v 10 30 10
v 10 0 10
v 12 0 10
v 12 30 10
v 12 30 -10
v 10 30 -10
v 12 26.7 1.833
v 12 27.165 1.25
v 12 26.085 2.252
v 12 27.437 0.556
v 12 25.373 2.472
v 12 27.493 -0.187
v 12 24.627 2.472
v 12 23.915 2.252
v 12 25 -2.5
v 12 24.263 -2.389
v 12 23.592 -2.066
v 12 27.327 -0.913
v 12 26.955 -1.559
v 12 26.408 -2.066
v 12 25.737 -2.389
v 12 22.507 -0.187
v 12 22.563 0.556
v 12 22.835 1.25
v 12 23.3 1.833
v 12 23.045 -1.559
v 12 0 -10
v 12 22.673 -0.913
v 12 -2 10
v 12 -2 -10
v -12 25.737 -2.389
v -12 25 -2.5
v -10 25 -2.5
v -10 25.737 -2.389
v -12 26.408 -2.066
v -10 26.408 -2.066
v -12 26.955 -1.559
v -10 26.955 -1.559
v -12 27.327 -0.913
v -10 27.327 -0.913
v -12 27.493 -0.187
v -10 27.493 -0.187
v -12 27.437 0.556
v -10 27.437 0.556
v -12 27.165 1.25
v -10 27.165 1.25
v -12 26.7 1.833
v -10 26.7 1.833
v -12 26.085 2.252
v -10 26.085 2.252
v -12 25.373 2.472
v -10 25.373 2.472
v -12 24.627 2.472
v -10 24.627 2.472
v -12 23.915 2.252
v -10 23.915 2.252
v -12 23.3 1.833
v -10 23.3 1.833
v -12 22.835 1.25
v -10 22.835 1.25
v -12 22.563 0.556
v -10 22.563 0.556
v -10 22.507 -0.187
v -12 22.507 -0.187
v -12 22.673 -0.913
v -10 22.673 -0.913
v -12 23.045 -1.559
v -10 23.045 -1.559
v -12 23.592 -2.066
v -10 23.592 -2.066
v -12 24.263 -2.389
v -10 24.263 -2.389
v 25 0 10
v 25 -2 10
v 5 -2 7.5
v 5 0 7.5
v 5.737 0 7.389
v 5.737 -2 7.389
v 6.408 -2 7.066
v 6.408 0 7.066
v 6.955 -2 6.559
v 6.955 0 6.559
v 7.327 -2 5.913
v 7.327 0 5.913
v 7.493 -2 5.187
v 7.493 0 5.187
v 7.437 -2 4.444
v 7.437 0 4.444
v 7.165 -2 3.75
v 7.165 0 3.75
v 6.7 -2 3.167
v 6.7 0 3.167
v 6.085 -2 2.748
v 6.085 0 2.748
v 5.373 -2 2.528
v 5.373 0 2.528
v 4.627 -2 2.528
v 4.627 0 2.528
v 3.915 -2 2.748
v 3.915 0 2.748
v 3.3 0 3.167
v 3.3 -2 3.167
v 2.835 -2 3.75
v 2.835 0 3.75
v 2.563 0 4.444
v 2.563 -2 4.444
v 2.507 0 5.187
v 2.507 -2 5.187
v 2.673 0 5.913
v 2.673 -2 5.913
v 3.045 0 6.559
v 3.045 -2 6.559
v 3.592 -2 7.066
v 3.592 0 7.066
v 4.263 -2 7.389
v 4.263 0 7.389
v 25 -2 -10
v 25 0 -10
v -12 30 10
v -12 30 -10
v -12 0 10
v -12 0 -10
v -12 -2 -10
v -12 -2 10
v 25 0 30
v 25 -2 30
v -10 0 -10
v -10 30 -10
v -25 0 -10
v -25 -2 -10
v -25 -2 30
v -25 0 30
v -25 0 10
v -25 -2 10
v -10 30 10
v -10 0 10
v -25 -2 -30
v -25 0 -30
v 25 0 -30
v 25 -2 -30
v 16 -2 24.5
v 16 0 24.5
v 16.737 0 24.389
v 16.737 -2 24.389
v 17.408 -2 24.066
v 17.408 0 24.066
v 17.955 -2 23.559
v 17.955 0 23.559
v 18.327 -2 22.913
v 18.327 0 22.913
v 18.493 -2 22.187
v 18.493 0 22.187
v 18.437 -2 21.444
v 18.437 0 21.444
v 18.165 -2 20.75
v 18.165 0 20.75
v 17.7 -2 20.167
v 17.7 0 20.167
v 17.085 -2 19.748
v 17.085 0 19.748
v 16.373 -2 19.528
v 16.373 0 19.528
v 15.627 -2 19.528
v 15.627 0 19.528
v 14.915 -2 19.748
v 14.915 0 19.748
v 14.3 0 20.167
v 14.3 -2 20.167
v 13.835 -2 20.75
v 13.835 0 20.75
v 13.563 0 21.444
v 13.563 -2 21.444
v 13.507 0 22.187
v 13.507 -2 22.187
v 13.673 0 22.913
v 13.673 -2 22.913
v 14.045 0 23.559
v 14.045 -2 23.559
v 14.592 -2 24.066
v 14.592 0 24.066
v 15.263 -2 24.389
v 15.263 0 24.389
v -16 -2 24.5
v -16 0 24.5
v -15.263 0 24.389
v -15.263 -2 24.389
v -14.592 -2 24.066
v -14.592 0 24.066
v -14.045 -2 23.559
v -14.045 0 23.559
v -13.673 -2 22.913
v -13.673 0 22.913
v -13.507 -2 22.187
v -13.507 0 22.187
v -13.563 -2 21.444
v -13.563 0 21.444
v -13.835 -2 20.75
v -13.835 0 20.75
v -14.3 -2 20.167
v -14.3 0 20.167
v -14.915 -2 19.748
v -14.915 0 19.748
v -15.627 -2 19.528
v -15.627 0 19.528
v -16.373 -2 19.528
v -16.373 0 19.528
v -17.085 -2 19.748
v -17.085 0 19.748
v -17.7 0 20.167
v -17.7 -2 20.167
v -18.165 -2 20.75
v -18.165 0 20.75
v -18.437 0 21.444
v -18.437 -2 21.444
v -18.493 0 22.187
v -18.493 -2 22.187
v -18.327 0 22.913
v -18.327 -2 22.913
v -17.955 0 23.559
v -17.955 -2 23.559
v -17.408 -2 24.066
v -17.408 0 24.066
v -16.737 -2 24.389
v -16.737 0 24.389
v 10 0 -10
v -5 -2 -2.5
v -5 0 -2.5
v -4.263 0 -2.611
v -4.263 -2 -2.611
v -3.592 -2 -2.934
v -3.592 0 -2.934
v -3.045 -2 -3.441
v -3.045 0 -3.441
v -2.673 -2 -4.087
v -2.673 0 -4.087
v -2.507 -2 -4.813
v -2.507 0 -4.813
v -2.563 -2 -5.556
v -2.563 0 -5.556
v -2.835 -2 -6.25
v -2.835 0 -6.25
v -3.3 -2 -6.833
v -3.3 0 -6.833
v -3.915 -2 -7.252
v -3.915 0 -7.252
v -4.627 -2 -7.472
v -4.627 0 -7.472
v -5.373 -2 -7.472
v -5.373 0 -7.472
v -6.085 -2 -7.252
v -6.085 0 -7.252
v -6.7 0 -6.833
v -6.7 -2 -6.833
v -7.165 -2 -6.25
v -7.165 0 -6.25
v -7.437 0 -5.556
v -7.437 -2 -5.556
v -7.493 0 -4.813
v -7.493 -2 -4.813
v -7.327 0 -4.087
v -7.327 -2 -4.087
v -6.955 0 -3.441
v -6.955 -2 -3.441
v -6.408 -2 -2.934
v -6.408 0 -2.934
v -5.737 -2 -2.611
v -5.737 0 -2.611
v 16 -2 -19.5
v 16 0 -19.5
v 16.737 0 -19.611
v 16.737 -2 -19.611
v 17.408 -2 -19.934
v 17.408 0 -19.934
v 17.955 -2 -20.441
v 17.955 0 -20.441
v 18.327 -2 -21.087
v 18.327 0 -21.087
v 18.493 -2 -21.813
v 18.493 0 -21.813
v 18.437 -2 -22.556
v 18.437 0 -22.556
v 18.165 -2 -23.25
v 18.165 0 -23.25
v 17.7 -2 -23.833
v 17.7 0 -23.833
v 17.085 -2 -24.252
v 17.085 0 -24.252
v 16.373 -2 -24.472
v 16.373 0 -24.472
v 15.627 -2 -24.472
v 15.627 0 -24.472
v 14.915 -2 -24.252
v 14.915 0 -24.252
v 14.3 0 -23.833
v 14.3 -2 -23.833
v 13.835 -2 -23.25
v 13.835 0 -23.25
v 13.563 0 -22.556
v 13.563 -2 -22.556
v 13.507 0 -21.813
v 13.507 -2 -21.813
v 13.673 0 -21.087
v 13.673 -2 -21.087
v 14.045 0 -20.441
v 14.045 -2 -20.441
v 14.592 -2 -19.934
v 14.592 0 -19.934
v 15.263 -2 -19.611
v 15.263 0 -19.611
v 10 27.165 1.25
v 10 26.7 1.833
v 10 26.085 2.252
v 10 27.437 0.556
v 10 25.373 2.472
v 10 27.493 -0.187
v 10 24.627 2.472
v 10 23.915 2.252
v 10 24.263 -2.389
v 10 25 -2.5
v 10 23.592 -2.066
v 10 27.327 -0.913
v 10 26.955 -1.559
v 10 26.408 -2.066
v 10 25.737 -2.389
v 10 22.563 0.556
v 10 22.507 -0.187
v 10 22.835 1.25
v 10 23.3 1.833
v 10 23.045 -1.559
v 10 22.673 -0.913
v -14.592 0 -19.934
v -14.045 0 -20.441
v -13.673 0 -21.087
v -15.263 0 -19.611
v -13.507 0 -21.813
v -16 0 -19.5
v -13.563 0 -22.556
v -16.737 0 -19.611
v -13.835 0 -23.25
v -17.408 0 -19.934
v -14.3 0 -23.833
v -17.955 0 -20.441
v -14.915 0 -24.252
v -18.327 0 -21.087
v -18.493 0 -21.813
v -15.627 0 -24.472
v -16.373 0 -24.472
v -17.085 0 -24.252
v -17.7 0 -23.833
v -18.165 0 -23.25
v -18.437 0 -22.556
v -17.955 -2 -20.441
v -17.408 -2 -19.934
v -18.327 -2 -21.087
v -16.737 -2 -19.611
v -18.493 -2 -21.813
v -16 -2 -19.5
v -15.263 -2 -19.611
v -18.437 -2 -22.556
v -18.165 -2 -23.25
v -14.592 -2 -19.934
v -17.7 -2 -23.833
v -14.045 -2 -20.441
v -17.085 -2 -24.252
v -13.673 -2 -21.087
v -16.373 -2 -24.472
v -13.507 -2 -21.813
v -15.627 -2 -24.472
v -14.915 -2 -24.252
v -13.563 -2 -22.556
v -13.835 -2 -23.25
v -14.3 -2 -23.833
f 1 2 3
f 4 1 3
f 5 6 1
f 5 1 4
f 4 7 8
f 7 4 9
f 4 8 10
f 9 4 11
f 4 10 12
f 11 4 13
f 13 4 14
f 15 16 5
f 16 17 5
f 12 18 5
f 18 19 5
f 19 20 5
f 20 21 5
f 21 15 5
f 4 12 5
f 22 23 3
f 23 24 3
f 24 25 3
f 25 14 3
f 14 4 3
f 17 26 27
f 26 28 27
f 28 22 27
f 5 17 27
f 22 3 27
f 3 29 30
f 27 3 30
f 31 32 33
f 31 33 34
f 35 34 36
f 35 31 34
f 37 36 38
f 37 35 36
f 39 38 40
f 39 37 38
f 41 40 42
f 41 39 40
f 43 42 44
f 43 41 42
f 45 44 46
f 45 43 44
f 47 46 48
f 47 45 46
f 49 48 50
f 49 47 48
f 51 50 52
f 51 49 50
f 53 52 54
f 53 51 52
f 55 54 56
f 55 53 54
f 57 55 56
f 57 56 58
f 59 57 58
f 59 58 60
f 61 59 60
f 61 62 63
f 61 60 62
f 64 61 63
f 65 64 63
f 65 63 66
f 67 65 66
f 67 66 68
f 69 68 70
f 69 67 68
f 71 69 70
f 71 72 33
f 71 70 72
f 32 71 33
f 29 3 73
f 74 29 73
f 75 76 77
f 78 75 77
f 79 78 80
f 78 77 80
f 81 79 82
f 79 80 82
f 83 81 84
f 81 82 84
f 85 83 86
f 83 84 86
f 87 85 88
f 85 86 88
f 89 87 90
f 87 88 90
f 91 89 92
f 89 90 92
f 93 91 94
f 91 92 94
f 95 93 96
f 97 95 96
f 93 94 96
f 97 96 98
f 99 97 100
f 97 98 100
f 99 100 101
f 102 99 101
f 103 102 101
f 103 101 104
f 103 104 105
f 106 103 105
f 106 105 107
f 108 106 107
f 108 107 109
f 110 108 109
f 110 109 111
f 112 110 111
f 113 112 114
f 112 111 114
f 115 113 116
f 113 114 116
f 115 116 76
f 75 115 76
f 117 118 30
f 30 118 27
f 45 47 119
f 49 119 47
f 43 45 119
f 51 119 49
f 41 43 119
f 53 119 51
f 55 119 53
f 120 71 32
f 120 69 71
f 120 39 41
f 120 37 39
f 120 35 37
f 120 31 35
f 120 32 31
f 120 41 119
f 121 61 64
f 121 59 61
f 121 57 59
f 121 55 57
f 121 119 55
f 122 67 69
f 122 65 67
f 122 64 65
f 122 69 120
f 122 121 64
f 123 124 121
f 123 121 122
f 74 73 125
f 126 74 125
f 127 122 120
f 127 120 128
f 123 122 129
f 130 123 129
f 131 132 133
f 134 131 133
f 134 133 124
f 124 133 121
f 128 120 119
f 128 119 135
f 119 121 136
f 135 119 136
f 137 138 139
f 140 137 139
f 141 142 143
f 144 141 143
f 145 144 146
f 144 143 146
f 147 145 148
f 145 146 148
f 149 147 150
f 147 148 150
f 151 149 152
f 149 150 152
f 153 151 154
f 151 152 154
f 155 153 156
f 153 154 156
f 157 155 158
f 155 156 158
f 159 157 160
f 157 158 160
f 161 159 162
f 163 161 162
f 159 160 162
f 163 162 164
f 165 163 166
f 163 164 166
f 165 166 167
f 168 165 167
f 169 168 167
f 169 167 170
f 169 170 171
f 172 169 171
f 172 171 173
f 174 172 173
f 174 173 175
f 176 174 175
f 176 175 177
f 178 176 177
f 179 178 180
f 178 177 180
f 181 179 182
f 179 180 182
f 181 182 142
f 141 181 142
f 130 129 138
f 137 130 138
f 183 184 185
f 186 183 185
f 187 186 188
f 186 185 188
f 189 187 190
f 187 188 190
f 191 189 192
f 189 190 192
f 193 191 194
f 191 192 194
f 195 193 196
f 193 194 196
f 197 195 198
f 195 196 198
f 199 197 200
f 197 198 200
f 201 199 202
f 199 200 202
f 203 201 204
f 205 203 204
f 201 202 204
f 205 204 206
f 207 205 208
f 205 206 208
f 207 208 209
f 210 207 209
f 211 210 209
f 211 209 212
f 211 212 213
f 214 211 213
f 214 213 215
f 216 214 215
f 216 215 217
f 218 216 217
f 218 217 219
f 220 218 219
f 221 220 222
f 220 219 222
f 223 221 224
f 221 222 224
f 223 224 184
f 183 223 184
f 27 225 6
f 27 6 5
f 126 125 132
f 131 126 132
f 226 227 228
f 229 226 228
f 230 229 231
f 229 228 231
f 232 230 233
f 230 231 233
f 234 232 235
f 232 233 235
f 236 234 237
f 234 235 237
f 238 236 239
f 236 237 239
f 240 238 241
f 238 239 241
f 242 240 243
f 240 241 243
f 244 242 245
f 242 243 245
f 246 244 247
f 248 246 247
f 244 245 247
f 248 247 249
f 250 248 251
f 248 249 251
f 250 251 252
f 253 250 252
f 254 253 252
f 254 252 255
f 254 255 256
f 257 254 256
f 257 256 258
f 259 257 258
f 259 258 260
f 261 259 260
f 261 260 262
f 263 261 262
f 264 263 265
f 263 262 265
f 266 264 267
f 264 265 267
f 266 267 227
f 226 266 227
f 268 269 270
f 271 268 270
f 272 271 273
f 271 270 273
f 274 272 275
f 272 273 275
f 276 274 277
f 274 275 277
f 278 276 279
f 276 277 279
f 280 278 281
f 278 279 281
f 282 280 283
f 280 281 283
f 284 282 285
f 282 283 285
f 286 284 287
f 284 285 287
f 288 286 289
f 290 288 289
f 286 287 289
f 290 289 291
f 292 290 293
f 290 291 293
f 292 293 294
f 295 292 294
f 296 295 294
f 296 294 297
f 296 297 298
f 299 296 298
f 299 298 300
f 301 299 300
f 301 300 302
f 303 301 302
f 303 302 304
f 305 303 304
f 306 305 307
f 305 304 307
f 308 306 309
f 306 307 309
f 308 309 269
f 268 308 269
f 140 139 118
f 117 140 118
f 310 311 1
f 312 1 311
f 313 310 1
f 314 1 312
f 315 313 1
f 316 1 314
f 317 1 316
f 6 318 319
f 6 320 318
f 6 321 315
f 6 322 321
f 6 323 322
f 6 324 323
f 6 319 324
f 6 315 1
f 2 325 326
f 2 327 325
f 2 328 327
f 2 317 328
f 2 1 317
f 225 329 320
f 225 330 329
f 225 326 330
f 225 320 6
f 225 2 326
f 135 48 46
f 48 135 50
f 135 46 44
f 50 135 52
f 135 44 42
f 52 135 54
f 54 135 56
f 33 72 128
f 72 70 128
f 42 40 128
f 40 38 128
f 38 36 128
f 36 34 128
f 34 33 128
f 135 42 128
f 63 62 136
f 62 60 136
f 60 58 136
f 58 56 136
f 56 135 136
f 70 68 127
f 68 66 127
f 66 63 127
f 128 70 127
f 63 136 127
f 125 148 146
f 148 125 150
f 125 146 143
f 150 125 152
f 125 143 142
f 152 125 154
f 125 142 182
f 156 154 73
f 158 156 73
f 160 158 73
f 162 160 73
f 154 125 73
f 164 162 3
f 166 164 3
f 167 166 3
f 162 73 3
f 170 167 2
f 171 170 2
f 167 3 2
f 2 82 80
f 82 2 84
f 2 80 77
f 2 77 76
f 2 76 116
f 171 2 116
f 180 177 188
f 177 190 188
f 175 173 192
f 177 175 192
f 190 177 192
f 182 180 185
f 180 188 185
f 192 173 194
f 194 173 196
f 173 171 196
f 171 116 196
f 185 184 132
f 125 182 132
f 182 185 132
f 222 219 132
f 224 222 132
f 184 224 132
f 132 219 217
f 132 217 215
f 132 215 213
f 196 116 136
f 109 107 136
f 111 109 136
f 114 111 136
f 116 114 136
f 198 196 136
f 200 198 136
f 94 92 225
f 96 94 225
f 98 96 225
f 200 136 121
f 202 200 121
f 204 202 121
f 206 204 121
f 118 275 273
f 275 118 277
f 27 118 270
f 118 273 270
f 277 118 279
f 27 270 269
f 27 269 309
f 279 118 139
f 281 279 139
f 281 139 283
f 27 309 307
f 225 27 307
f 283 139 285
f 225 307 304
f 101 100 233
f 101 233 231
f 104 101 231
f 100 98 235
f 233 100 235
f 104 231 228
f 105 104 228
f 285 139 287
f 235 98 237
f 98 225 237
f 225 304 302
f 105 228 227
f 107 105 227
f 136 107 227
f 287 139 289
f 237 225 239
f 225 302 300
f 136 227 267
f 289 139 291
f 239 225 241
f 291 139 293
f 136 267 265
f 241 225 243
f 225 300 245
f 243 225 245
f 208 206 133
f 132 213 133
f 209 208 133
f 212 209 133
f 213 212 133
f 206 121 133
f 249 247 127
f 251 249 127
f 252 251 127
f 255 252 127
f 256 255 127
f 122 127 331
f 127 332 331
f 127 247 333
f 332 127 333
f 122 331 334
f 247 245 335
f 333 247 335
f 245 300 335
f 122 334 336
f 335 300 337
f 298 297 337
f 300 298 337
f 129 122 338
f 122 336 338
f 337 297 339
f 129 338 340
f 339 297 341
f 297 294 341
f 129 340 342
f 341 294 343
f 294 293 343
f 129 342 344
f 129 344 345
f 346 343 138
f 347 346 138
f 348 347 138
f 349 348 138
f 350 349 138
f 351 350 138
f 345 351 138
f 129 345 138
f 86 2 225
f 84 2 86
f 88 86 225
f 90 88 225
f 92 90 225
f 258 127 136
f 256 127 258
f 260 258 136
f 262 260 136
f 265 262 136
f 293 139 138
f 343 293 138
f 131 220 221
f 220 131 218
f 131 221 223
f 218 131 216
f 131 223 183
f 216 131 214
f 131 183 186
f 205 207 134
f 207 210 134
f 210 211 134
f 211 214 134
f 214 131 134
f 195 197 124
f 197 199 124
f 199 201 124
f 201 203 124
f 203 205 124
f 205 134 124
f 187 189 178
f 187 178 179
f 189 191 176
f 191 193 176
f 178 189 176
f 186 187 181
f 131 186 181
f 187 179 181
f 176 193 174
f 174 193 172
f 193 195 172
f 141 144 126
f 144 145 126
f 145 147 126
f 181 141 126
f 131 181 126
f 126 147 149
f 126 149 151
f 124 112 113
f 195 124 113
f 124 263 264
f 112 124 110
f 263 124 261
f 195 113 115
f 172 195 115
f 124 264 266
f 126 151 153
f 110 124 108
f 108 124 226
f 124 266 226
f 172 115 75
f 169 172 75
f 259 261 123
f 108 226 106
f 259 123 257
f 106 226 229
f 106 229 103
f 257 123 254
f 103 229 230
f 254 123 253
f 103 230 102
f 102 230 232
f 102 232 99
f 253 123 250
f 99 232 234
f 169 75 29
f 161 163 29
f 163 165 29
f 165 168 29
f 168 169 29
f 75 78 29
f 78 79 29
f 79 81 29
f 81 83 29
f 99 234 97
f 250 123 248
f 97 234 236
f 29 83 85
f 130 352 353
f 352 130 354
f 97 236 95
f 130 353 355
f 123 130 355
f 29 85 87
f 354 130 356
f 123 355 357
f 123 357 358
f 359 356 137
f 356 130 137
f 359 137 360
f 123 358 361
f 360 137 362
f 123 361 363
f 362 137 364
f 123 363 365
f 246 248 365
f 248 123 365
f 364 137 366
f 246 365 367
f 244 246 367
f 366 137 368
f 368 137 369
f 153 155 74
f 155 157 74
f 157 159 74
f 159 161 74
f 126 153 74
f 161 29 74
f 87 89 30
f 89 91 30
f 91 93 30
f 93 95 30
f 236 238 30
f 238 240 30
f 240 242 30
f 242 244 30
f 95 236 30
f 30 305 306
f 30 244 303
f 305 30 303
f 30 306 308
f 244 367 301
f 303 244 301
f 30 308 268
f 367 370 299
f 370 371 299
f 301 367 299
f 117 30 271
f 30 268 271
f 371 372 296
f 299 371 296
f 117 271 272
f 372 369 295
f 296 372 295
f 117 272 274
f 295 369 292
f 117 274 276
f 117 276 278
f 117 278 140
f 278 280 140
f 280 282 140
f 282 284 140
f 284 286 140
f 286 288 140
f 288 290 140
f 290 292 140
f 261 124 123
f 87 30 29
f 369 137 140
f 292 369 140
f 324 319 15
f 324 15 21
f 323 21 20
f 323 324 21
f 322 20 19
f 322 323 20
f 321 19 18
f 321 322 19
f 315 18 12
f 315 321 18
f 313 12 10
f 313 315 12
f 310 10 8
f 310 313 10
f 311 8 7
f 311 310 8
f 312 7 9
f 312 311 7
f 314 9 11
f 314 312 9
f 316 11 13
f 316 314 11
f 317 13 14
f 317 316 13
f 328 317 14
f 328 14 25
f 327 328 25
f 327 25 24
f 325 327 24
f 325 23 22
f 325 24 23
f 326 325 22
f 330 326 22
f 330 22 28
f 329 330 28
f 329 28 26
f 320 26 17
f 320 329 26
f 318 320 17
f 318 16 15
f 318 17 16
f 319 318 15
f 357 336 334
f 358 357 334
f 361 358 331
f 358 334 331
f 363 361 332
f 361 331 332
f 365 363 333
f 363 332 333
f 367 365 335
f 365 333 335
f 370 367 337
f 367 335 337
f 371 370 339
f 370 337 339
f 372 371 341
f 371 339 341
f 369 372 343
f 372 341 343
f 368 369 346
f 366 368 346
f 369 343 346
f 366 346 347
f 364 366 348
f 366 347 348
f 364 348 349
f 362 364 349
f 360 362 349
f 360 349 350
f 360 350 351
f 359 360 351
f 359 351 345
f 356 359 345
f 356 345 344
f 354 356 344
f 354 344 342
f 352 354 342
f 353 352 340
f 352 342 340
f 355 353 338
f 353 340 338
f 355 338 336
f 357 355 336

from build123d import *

# Parameters (mm, degrees)
RESSALTO_EXTRUS_O1_DEPTH      = 2
RESSALTO_EXTRUS_O3_DEPTH      = 30
RESSALTO_EXTRUS_O3_DEPTH_BACK = 2
ESBO_O2_W                     = 2
ESBO_O2_H                     = 20
ESBO_O3_R                     = 2.5
CORTE_EXTRUS_O1_DEPTH         = 2
CORTE_EXTRUS_O2_DEPTH         = 50.244289009
CORTE_EXTRUS_O2_DEPTH_BACK    = 50.244289009
ESBO_O4_R                     = 2.5


with BuildPart() as part:
    # Esboço1 → Ressalto-extrusão1 (new body)
    with BuildSketch(Plane(origin=(0, 0, 0), x_dir=(1, 0, 0), z_dir=(0, 1, 0))):
        Polygon((10, 10), (10, -10), (25, -10), (25, -30), (-25, -30), (-25, -10), (-10, -10), (-10, 10), (-25, 10), (-25, 30), (25, 30), (25, 10), align=None)
    extrude(amount=-RESSALTO_EXTRUS_O1_DEPTH)

    # Esboço2 → Ressalto-extrusão3 (add, two sides: drawn at the far end of the back side and taken through both)
    with BuildSketch(Plane(origin=(0, 0, 0), x_dir=(1, 0, 0), z_dir=(0, 1, 0)).offset(-RESSALTO_EXTRUS_O3_DEPTH_BACK)):
        with Locations((-11, 0)):
            Rectangle(ESBO_O2_W, ESBO_O2_H)
        with Locations((11, 0)):
            Rectangle(ESBO_O2_W, ESBO_O2_H)
    extrude(amount=RESSALTO_EXTRUS_O3_DEPTH + RESSALTO_EXTRUS_O3_DEPTH_BACK)

    # Esboço3 → Corte-extrusão1 (cut)
    with BuildSketch(Plane(origin=(0, 0, 0), x_dir=(1, 0, 0), z_dir=(0, 1, 0))):
        with Locations(Location((16, -22, 0), (0, 0, 270))):
            Circle(ESBO_O3_R)
        with Locations(Location((-16, -22, 0), (0, 0, 270))):
            Circle(ESBO_O3_R)
        with Locations(Location((5, -5, 0), (0, 0, 270))):
            Circle(ESBO_O3_R)
        with Locations(Location((-5, 5, 0), (0, 0, 270))):
            Circle(ESBO_O3_R)
        with Locations(Location((16, 22, 0), (0, 0, 270))):
            Circle(ESBO_O3_R)
        with Locations(Location((-16, 22, 0), (0, 0, 270))):
            Circle(ESBO_O3_R)
    extrude(amount=-CORTE_EXTRUS_O1_DEPTH, mode=Mode.SUBTRACT)

    # Esboço4 → Corte-extrusão2 (cut, two sides: drawn at the far end of the back side and taken through both)
    with BuildSketch(Plane(origin=(0, 0, 0), x_dir=(0, 0, -1), z_dir=(1, 0, 0)).offset(-CORTE_EXTRUS_O2_DEPTH_BACK)):
        with Locations((0, 25)):
            Circle(ESBO_O4_R)
    extrude(amount=CORTE_EXTRUS_O2_DEPTH + CORTE_EXTRUS_O2_DEPTH_BACK, mode=Mode.SUBTRACT)


solid = part.part
